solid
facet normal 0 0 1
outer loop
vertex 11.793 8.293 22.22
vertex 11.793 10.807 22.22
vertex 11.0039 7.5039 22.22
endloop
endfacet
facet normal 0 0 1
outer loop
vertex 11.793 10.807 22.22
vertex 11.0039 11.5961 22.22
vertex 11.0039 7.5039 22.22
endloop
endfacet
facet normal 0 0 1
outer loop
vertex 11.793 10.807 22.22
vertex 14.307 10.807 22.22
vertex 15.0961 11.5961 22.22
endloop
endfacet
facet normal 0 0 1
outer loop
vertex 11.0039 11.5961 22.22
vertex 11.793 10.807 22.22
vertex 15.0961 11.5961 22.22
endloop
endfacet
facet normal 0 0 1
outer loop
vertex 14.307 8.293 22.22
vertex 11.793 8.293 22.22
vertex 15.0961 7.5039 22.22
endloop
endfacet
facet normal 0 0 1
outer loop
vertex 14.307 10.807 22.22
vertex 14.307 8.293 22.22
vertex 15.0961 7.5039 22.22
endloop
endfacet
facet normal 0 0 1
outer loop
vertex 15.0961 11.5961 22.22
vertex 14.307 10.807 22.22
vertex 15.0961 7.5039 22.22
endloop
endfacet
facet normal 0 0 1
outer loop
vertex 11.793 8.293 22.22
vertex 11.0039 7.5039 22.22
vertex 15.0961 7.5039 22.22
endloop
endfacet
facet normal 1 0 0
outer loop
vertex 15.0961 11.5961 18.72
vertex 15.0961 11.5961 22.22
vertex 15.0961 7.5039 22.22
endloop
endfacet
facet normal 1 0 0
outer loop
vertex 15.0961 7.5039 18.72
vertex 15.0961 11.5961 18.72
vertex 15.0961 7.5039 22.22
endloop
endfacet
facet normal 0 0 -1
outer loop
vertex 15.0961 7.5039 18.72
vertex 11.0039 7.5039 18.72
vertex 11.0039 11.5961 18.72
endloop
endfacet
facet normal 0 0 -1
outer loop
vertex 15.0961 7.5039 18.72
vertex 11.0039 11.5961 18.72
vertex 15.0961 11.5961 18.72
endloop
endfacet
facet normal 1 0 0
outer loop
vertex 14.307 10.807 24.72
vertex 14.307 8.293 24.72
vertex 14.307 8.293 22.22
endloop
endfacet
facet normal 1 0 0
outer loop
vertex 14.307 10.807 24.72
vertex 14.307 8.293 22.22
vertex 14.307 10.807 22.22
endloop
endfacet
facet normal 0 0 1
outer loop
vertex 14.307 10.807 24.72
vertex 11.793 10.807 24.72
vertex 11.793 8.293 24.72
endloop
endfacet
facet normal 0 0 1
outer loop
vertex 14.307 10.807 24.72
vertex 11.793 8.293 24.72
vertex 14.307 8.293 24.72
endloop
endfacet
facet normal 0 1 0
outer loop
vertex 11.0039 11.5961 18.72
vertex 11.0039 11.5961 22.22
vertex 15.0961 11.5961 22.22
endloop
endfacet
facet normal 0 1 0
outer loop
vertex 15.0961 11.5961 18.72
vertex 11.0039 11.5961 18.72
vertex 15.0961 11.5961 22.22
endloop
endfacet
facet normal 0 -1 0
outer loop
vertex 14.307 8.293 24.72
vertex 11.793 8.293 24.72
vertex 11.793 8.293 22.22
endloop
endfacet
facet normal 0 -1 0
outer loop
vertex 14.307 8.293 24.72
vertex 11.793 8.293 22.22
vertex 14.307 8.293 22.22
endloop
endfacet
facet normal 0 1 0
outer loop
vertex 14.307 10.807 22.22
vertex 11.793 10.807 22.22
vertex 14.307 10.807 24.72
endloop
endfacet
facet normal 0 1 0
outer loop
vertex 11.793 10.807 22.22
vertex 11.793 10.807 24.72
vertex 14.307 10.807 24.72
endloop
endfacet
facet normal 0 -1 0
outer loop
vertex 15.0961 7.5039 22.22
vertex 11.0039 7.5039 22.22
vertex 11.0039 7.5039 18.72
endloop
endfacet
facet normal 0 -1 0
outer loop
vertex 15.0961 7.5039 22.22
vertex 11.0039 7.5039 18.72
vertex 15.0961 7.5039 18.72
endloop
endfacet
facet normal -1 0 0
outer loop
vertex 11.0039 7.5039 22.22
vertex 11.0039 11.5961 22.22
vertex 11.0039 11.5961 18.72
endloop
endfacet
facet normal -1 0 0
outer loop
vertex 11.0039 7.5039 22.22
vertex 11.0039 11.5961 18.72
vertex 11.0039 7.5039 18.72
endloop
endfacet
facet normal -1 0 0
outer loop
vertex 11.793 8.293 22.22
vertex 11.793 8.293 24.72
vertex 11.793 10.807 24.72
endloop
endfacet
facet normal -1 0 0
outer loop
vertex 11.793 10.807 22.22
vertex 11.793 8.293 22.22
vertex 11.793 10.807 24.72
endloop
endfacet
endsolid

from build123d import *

# Parameters (mm, degrees)
SKETCH010_W  = 2.513972
SKETCH010_H  = 2.513972
PAD003_DEPTH = 1.5
PAD004_DEPTH = 1
SKETCH011_W  = 4.09222
SKETCH011_H  = 4.09222
PAD005_DEPTH = 3.5


with BuildPart() as part:
    # Sketch010 (on Face1 of ShapeBinder002) → Pad003 (new body)
    with BuildSketch(Plane.XY.offset(23.22)):
        with Locations((13.05, 9.55)):
            Rectangle(SKETCH010_W, SKETCH010_H)
    extrude(amount=PAD003_DEPTH)

    # Sketch010 (on Face1 of ShapeBinder002) → Pad004 (join)
    with BuildSketch(Plane.XY.offset(23.22)):
        with Locations((13.05, 9.55)):
            Rectangle(SKETCH010_W, SKETCH010_H)
    extrude(amount=-PAD004_DEPTH)

    # Sketch011 (on Face1 of Pad004) → Pad005 (join)
    with BuildSketch(Plane(origin=(0, 0, 22.22), x_dir=(1, 0, 0), z_dir=(0, 0, -1))):
        with Locations((13.05, -9.55)):
            Rectangle(SKETCH011_W, SKETCH011_H)
    extrude(amount=PAD005_DEPTH)


solid = part.part
